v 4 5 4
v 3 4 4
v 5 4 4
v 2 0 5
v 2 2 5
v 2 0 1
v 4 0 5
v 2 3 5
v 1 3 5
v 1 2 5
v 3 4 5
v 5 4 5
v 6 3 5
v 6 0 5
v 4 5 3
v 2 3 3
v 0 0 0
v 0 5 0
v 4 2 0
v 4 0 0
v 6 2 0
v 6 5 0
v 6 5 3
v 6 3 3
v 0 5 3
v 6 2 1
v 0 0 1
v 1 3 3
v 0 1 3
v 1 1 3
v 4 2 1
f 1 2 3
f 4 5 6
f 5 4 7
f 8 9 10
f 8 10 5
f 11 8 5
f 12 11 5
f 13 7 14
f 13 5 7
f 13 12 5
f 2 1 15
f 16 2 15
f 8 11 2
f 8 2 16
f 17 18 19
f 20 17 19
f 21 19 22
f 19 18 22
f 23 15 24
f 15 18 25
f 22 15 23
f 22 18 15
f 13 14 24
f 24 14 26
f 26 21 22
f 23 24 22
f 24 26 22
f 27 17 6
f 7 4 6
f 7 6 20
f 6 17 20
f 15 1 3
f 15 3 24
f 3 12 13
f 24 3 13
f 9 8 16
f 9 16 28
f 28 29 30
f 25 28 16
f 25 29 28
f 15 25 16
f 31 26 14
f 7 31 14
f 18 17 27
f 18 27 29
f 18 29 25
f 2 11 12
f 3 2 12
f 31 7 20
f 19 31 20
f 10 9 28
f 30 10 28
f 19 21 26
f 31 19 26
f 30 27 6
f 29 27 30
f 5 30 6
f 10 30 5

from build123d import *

# Parameters (mm, degrees)
SKETCH1_W           = 6
SKETCH1_H           = 5
BOSS_EXTRUDE1_DEPTH = 5
CUT_EXTRUDE1_DEPTH  = 2
CUT_EXTRUDE2_DEPTH  = 2
SKETCH5_W           = 1
SKETCH5_H           = 2
CUT_EXTRUDE3_DEPTH  = 5
CUT_EXTRUDE4_DEPTH  = 2
CUT_EXTRUDE5_DEPTH  = 2
CUT_EXTRUDE6_DEPTH  = 1


with BuildPart() as part:
    # Sketch1 → Boss-Extrude1 (new body)
    with BuildSketch(Plane.XY):
        with Locations((3, 2.5)):
            Rectangle(SKETCH1_W, SKETCH1_H)
    extrude(amount=BOSS_EXTRUDE1_DEPTH)

    # Sketch2 → Cut-Extrude1 (cut)
    with BuildSketch(Plane(origin=(6, 0, 0), x_dir=(0, 0, -1), z_dir=(1, 0, 0))):
        Polygon((0, 2), (-1, 2), (-5, 0), (0, 0), align=None)
    extrude(amount=-CUT_EXTRUDE1_DEPTH, mode=Mode.SUBTRACT)

    # Sketch4 → Cut-Extrude2 (cut)
    with BuildSketch(Plane.ZY):
        Polygon((1, 0), (5, 2), (5, 0), align=None)
    extrude(amount=-CUT_EXTRUDE2_DEPTH, mode=Mode.SUBTRACT)

    # Sketch5 → Cut-Extrude3 (cut)
    with BuildSketch(Plane(origin=(0, 5, 0), x_dir=(1, 0, 0), z_dir=(0, 1, 0))):
        with Locations((0.5, -4)):
            Rectangle(SKETCH5_W, SKETCH5_H)
    extrude(amount=-CUT_EXTRUDE3_DEPTH, mode=Mode.SUBTRACT)

    # Sketch6 → Cut-Extrude4 (cut)
    with BuildSketch(Plane.XY.offset(5)):
        Polygon((4, 5), (6, 3), (6, 5), align=None)
    extrude(amount=-CUT_EXTRUDE4_DEPTH, mode=Mode.SUBTRACT)

    # Sketch7 → Cut-Extrude5 (cut)
    with BuildSketch(Plane.XY.offset(5)):
        Polygon((4, 5), (2, 3), (1, 3), (1, 5), align=None)
    extrude(amount=-CUT_EXTRUDE5_DEPTH, mode=Mode.SUBTRACT)

    # Sketch8 → Cut-Extrude6 (cut)
    with BuildSketch(Plane.XY.offset(5)):
        Polygon((3, 4), (5, 4), (4, 5), align=None)
    extrude(amount=-CUT_EXTRUDE6_DEPTH, mode=Mode.SUBTRACT)


solid = part.part
